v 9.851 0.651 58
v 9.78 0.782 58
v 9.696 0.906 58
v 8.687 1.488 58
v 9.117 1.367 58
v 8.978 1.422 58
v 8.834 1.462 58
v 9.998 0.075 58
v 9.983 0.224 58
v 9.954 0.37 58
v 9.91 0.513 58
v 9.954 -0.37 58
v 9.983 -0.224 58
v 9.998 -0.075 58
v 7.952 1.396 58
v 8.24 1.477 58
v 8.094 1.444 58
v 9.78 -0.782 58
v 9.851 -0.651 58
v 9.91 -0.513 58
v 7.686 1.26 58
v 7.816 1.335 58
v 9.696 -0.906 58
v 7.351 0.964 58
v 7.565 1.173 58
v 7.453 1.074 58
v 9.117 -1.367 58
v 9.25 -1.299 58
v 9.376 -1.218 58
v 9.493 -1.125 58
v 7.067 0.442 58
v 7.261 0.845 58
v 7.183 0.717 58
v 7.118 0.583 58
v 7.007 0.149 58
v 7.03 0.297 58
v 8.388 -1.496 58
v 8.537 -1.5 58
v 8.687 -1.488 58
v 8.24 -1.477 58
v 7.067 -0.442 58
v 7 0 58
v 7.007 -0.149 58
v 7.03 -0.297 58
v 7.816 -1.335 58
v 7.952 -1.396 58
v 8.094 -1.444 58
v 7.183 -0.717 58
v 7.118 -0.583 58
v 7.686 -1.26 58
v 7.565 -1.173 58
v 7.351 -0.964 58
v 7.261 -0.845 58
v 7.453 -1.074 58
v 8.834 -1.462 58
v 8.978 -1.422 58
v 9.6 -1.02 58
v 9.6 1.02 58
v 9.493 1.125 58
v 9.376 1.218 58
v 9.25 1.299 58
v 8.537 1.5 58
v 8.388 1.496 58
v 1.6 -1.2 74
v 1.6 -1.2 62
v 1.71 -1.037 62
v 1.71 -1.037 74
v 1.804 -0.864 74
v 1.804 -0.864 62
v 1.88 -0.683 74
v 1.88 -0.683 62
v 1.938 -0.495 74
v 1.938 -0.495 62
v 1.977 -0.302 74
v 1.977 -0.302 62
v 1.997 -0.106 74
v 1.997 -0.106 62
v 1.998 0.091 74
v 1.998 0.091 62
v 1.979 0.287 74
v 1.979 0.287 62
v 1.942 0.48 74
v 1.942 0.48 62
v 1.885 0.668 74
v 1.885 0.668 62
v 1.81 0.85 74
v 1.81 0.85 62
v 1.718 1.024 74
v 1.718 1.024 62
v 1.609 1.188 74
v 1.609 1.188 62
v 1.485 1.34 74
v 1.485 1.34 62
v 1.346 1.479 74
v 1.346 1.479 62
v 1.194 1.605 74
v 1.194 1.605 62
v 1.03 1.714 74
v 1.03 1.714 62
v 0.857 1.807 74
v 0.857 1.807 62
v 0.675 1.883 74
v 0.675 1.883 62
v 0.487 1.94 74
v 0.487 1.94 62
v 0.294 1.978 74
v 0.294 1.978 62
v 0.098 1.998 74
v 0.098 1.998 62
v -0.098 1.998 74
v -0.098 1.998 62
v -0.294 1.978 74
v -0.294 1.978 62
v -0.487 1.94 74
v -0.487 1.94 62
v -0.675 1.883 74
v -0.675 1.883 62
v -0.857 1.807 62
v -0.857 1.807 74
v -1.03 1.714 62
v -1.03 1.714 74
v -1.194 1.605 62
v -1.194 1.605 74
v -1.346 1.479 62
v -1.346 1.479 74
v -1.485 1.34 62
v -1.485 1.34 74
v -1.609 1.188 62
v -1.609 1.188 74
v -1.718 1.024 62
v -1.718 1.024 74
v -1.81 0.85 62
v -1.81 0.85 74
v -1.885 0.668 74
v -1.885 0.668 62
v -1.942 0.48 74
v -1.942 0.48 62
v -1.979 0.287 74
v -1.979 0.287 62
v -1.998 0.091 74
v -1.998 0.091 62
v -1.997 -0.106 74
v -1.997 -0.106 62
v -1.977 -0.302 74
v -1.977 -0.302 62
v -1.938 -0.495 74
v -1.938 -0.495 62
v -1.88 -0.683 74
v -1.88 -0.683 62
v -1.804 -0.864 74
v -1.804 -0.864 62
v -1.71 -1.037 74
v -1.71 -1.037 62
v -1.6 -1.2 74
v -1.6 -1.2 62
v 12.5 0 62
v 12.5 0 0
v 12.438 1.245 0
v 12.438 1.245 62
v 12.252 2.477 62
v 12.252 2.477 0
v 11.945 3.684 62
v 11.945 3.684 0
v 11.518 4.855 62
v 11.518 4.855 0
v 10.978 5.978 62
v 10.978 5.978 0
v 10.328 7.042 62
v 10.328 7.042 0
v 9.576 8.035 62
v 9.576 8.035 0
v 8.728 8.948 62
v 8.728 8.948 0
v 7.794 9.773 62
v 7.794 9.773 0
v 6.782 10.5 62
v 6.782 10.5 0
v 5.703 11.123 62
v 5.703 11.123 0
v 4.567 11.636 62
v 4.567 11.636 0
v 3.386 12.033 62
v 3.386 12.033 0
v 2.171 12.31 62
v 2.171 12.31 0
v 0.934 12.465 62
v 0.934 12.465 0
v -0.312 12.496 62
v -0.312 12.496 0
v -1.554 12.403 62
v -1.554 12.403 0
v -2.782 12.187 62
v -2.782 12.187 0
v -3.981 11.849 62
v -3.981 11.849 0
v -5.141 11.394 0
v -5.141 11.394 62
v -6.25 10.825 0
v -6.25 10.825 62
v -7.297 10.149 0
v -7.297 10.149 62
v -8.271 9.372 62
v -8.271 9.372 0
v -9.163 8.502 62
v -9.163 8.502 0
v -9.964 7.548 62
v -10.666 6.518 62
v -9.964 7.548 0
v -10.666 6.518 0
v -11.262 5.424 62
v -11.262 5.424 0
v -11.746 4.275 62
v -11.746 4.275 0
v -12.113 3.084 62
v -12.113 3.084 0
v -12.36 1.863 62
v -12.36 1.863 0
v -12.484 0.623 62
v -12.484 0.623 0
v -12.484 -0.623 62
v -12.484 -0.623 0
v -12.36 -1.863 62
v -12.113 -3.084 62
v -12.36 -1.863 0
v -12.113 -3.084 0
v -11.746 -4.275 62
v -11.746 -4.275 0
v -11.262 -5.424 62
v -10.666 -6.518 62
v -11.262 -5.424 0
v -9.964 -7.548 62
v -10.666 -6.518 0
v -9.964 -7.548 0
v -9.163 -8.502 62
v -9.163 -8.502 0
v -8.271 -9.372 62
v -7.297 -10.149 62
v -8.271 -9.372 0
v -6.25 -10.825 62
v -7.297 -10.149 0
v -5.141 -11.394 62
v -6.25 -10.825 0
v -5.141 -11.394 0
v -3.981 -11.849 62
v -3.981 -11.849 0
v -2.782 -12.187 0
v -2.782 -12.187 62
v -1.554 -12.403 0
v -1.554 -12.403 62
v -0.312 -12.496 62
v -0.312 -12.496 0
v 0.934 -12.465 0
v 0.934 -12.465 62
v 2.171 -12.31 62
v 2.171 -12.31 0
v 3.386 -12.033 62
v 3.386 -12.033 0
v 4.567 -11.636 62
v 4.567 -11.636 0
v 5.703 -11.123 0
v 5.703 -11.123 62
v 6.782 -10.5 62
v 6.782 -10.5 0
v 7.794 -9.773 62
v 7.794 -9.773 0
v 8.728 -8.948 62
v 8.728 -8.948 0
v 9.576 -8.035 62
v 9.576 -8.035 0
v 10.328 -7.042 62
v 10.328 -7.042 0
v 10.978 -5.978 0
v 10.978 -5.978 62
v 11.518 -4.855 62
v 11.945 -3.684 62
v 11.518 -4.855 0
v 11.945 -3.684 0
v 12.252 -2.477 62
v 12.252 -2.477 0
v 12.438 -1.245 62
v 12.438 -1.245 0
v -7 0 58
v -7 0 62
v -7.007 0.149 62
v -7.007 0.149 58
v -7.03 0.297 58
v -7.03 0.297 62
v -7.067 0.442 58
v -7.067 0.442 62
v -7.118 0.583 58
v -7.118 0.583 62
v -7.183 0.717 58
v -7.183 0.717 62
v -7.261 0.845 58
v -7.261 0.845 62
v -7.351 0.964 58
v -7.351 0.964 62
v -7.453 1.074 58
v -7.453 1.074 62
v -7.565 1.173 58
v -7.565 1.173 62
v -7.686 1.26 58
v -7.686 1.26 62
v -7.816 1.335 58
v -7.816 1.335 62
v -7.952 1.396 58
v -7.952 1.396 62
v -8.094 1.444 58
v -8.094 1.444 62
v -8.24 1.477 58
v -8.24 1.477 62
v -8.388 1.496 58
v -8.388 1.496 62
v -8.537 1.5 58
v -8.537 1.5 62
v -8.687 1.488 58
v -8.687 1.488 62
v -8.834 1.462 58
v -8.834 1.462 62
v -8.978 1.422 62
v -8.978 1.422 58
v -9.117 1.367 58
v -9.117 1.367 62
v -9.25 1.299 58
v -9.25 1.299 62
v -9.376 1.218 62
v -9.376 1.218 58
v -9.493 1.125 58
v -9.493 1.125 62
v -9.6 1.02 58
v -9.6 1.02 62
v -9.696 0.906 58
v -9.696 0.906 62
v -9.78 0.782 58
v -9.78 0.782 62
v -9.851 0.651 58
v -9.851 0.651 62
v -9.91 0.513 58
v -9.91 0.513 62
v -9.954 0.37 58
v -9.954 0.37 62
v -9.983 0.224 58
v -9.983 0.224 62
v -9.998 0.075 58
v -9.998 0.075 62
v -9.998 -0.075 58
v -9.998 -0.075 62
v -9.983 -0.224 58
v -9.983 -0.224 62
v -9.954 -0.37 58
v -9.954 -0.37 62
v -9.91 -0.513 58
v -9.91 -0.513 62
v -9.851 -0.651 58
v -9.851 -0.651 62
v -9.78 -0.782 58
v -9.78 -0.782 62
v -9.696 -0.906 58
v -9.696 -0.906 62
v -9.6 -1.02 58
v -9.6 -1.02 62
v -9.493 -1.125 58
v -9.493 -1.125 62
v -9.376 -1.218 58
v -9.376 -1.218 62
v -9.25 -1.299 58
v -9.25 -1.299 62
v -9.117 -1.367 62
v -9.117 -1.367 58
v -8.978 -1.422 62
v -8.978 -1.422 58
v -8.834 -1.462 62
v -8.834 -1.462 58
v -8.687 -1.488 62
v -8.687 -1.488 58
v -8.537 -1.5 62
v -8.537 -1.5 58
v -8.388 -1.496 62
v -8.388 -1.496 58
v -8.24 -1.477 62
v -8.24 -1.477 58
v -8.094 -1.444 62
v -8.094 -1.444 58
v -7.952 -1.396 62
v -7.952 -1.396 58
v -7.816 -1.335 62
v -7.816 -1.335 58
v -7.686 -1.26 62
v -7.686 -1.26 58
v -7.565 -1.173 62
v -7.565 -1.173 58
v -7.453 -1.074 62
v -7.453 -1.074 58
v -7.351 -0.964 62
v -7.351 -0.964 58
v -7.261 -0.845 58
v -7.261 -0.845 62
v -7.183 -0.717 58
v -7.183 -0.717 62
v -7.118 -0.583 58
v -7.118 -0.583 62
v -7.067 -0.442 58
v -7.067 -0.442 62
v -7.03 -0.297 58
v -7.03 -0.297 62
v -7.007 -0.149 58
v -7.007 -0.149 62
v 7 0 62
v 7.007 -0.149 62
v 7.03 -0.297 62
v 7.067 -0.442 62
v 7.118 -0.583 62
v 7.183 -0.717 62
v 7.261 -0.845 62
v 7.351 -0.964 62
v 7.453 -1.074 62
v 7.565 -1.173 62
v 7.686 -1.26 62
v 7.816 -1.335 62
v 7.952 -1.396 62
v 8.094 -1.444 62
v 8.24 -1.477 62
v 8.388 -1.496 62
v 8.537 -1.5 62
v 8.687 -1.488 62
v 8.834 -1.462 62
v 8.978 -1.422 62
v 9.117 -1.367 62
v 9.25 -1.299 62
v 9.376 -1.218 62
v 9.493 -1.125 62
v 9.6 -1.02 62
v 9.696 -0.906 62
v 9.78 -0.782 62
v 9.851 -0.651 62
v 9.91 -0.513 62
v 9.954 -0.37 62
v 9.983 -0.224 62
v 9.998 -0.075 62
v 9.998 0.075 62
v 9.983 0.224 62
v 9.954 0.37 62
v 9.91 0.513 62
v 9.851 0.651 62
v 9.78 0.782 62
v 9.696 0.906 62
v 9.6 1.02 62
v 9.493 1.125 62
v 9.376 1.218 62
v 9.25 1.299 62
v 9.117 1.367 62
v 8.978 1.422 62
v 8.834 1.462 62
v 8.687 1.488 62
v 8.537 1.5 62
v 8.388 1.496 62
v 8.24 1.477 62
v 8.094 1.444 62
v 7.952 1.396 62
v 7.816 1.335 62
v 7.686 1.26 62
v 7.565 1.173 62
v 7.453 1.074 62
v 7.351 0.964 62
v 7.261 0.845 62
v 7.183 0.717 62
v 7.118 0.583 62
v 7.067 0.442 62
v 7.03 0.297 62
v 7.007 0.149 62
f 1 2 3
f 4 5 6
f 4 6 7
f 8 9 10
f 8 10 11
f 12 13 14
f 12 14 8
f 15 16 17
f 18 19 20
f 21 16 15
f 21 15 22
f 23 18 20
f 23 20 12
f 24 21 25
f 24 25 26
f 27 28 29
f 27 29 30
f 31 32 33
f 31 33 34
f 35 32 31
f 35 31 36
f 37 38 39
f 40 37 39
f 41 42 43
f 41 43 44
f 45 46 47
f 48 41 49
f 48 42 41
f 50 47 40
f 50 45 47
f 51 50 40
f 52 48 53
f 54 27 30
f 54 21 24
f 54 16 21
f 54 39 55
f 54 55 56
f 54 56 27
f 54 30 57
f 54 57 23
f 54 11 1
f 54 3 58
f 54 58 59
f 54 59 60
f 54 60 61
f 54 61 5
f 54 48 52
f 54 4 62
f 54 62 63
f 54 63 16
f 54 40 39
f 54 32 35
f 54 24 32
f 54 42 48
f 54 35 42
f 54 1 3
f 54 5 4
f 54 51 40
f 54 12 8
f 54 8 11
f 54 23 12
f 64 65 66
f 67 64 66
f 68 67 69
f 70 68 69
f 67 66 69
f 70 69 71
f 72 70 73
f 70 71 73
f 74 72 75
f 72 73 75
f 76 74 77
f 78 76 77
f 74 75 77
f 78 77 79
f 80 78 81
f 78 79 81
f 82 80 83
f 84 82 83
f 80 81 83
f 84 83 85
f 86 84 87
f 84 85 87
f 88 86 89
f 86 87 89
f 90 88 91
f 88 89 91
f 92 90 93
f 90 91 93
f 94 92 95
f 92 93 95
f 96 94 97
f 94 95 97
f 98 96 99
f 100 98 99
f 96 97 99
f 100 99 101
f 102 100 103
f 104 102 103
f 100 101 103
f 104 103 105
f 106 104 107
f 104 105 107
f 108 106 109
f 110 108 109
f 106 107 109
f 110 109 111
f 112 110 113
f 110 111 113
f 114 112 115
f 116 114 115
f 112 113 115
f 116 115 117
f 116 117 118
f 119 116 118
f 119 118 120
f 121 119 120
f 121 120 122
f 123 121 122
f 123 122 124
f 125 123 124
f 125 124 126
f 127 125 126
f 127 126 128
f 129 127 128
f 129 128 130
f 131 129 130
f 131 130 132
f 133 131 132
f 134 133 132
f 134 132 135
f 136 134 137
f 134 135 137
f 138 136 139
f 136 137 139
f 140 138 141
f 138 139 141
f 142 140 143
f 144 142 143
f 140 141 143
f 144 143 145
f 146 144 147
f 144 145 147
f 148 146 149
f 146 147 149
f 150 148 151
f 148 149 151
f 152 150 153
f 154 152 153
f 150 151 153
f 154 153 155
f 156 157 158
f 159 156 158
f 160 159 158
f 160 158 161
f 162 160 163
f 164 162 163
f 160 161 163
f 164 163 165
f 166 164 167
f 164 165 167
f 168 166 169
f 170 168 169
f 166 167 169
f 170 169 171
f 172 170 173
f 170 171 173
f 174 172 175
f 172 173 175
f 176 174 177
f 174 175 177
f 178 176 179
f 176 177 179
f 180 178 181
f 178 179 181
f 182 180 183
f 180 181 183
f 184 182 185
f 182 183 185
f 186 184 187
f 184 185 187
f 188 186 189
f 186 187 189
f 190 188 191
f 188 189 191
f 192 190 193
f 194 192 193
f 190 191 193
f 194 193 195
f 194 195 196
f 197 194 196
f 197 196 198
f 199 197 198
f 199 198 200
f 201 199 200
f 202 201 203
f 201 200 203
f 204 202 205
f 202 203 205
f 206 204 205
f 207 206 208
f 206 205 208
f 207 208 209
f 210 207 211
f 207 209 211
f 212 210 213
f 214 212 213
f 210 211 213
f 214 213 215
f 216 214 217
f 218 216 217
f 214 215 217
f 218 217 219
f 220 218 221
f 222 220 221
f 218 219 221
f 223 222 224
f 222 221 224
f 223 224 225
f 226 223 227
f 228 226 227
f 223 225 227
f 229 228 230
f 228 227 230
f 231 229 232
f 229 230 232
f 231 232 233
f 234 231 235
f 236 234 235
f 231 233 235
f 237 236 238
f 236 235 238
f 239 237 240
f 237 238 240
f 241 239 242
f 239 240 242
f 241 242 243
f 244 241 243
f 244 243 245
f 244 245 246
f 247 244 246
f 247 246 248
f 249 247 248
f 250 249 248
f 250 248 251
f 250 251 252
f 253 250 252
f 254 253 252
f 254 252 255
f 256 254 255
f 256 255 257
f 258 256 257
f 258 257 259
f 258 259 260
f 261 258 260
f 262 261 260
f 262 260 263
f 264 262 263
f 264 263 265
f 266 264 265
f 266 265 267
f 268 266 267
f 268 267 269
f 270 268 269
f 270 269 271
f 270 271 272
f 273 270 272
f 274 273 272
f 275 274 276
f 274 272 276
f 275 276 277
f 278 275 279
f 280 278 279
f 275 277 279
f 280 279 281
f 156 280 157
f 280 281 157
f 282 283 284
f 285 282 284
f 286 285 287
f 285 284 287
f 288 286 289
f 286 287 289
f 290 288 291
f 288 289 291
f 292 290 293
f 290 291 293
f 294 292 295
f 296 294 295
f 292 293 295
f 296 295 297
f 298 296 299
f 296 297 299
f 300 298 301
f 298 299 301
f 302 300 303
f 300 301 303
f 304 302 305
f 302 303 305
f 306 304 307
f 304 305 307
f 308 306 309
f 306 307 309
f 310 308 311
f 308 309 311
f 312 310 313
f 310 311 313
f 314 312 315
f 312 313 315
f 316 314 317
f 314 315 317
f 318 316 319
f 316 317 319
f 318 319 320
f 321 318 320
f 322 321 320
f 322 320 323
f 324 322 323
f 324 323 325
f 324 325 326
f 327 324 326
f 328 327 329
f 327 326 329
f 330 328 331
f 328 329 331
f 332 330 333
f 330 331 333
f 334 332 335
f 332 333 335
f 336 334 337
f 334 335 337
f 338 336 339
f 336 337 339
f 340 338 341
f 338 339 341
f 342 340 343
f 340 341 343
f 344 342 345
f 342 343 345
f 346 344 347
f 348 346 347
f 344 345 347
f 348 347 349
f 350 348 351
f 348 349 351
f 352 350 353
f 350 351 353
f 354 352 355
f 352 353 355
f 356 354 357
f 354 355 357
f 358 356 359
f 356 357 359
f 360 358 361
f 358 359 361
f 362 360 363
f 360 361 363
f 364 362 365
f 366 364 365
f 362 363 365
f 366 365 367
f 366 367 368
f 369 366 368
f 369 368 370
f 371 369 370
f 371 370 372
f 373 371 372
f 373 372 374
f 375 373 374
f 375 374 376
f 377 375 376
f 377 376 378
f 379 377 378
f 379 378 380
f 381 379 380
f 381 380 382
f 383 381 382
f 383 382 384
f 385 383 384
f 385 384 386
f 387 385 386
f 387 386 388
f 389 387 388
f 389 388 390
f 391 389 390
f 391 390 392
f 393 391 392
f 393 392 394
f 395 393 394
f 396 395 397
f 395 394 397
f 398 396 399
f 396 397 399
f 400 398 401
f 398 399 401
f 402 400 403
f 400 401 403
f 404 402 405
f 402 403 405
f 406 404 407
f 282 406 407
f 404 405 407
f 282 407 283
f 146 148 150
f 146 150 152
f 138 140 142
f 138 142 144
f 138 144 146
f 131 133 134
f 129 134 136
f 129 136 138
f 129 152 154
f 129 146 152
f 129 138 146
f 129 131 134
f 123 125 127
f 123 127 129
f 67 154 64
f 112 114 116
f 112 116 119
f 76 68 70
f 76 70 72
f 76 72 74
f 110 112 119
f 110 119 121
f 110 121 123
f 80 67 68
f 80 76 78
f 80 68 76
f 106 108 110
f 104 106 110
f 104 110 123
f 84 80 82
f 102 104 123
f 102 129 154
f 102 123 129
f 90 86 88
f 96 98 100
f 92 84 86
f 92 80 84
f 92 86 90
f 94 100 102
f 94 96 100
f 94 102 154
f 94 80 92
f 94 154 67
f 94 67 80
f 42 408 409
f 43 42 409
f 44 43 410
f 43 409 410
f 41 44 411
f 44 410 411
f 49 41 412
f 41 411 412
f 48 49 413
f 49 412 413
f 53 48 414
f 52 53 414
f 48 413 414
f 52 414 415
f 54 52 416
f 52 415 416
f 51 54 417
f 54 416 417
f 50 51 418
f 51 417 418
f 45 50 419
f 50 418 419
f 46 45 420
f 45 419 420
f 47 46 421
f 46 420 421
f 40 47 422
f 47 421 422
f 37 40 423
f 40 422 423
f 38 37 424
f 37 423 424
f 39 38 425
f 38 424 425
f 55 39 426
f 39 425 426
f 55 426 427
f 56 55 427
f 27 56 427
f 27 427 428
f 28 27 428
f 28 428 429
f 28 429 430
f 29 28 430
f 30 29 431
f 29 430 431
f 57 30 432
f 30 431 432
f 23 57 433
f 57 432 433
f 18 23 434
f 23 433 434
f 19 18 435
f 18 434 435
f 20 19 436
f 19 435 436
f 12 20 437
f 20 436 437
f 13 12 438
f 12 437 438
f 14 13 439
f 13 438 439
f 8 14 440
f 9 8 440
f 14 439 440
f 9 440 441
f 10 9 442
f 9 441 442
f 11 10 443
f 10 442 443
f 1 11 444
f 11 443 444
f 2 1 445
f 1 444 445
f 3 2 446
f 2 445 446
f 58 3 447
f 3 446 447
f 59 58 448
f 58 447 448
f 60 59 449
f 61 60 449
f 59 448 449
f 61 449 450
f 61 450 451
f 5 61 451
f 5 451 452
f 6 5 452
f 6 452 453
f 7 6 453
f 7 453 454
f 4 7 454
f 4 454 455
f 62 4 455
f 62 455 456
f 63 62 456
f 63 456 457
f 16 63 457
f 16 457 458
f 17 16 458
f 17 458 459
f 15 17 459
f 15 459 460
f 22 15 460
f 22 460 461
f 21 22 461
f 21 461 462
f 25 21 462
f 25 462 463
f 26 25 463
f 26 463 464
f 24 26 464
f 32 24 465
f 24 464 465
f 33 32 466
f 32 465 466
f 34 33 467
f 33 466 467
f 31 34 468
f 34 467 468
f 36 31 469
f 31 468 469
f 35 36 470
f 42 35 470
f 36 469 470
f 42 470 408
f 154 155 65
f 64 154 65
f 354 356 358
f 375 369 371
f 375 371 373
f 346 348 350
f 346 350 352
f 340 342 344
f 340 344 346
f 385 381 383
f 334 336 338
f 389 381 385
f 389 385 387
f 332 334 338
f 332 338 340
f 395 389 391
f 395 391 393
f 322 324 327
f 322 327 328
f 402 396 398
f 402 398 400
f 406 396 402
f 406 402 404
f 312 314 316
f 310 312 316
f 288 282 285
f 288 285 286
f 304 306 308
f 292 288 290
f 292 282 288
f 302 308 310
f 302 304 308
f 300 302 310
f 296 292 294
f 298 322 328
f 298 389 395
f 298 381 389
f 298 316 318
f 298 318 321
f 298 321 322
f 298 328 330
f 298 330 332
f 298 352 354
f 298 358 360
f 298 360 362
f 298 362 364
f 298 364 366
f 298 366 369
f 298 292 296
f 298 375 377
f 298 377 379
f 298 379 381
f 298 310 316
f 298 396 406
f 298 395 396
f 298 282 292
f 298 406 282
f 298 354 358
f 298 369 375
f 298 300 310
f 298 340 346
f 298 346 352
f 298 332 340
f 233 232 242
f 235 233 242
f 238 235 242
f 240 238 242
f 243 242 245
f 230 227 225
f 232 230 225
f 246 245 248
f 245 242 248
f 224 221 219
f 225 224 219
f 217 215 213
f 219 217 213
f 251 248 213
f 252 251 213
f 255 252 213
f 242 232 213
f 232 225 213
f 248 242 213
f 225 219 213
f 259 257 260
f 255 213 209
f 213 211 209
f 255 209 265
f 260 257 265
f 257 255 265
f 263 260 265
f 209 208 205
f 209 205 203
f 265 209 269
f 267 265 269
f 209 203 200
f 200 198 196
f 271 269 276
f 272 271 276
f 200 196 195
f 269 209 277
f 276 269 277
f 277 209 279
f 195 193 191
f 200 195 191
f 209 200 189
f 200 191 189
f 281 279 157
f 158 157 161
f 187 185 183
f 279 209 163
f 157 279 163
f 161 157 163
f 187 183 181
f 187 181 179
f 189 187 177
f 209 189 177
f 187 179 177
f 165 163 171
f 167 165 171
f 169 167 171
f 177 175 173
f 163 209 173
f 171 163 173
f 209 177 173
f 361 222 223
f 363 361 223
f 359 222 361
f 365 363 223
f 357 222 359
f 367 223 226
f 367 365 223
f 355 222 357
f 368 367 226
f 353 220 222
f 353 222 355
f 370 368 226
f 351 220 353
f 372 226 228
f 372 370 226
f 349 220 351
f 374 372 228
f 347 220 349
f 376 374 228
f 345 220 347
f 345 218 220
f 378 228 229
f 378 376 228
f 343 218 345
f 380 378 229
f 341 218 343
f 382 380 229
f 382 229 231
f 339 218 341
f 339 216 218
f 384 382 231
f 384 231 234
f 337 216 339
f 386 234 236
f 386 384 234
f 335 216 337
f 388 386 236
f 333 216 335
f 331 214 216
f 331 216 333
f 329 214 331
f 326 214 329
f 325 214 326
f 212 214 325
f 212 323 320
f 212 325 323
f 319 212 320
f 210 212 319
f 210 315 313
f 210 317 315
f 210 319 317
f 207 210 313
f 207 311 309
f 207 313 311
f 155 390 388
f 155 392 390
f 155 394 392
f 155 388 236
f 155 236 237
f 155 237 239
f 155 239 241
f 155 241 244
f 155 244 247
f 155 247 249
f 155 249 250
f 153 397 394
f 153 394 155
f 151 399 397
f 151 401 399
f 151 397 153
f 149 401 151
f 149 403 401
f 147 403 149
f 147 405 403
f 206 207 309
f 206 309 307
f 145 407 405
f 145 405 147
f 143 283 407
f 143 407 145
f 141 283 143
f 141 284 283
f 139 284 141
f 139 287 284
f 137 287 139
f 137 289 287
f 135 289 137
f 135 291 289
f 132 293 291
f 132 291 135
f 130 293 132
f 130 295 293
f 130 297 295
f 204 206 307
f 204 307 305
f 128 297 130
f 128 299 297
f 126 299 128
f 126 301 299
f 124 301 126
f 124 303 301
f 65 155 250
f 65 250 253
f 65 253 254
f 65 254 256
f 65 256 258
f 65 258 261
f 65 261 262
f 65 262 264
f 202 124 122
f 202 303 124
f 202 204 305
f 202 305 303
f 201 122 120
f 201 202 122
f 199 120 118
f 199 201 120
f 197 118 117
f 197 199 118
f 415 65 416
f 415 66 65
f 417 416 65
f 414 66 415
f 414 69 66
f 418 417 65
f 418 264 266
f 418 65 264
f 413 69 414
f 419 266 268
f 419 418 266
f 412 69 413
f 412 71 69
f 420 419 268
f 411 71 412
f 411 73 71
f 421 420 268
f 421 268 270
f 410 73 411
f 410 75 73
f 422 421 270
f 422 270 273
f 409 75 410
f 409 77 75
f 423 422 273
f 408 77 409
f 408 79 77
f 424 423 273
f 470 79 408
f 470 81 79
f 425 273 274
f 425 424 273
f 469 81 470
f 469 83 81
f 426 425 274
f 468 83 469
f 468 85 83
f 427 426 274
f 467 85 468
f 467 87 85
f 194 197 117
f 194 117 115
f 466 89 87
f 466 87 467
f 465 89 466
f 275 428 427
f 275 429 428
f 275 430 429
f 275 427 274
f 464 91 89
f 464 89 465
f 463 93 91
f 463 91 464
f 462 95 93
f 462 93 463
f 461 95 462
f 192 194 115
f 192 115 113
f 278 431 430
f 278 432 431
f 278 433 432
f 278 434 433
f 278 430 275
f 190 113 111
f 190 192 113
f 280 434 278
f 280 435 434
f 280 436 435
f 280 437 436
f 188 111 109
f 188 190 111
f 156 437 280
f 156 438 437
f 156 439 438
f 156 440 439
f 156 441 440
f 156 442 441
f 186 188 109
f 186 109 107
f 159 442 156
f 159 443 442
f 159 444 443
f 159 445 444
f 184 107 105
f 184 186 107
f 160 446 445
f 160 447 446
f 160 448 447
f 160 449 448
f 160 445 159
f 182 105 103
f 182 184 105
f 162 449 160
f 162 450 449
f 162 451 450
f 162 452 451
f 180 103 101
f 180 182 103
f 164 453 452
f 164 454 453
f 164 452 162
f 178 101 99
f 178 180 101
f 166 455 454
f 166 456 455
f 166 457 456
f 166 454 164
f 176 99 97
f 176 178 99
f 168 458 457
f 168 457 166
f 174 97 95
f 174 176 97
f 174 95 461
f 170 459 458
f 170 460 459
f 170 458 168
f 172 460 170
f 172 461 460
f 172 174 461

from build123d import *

# Parameters (mm, degrees)
SKICA1_R                 = 12.5
P_IDAT_VYSUNUT_M1_DEPTH  = 62
P_IDAT_VYSUNUT_M2_DEPTH  = 12
SKICA3_R                 = 1.5
ODEBRAT_VYSUNUT_M1_DEPTH = 4


with BuildPart() as part:
    # Skica1 → Přidat vysunutím1 (new body)
    with BuildSketch(Plane.XY):
        Circle(SKICA1_R)
    extrude(amount=P_IDAT_VYSUNUT_M1_DEPTH)

    # Skica2 → Přidat vysunutím2 (add)
    with BuildSketch(Plane.XY.offset(62)):
        with BuildLine():
            Line((-1.6, -1.2), (1.6, -1.2))
            ThreePointArc((1.6, -1.2), (0, 2), (-1.6, -1.2))
        make_face()
    extrude(amount=P_IDAT_VYSUNUT_M2_DEPTH)

    # Skica3 → Odebrat vysunutím1 (cut)
    with BuildSketch(Plane.XY.offset(62)):
        with Locations((-8.5, 0)):
            Circle(SKICA3_R)
        with Locations(Location((8.5, 0, 0), (0, 0, 180))):
            Circle(SKICA3_R)
    extrude(amount=-ODEBRAT_VYSUNUT_M1_DEPTH, mode=Mode.SUBTRACT)


solid = part.part
